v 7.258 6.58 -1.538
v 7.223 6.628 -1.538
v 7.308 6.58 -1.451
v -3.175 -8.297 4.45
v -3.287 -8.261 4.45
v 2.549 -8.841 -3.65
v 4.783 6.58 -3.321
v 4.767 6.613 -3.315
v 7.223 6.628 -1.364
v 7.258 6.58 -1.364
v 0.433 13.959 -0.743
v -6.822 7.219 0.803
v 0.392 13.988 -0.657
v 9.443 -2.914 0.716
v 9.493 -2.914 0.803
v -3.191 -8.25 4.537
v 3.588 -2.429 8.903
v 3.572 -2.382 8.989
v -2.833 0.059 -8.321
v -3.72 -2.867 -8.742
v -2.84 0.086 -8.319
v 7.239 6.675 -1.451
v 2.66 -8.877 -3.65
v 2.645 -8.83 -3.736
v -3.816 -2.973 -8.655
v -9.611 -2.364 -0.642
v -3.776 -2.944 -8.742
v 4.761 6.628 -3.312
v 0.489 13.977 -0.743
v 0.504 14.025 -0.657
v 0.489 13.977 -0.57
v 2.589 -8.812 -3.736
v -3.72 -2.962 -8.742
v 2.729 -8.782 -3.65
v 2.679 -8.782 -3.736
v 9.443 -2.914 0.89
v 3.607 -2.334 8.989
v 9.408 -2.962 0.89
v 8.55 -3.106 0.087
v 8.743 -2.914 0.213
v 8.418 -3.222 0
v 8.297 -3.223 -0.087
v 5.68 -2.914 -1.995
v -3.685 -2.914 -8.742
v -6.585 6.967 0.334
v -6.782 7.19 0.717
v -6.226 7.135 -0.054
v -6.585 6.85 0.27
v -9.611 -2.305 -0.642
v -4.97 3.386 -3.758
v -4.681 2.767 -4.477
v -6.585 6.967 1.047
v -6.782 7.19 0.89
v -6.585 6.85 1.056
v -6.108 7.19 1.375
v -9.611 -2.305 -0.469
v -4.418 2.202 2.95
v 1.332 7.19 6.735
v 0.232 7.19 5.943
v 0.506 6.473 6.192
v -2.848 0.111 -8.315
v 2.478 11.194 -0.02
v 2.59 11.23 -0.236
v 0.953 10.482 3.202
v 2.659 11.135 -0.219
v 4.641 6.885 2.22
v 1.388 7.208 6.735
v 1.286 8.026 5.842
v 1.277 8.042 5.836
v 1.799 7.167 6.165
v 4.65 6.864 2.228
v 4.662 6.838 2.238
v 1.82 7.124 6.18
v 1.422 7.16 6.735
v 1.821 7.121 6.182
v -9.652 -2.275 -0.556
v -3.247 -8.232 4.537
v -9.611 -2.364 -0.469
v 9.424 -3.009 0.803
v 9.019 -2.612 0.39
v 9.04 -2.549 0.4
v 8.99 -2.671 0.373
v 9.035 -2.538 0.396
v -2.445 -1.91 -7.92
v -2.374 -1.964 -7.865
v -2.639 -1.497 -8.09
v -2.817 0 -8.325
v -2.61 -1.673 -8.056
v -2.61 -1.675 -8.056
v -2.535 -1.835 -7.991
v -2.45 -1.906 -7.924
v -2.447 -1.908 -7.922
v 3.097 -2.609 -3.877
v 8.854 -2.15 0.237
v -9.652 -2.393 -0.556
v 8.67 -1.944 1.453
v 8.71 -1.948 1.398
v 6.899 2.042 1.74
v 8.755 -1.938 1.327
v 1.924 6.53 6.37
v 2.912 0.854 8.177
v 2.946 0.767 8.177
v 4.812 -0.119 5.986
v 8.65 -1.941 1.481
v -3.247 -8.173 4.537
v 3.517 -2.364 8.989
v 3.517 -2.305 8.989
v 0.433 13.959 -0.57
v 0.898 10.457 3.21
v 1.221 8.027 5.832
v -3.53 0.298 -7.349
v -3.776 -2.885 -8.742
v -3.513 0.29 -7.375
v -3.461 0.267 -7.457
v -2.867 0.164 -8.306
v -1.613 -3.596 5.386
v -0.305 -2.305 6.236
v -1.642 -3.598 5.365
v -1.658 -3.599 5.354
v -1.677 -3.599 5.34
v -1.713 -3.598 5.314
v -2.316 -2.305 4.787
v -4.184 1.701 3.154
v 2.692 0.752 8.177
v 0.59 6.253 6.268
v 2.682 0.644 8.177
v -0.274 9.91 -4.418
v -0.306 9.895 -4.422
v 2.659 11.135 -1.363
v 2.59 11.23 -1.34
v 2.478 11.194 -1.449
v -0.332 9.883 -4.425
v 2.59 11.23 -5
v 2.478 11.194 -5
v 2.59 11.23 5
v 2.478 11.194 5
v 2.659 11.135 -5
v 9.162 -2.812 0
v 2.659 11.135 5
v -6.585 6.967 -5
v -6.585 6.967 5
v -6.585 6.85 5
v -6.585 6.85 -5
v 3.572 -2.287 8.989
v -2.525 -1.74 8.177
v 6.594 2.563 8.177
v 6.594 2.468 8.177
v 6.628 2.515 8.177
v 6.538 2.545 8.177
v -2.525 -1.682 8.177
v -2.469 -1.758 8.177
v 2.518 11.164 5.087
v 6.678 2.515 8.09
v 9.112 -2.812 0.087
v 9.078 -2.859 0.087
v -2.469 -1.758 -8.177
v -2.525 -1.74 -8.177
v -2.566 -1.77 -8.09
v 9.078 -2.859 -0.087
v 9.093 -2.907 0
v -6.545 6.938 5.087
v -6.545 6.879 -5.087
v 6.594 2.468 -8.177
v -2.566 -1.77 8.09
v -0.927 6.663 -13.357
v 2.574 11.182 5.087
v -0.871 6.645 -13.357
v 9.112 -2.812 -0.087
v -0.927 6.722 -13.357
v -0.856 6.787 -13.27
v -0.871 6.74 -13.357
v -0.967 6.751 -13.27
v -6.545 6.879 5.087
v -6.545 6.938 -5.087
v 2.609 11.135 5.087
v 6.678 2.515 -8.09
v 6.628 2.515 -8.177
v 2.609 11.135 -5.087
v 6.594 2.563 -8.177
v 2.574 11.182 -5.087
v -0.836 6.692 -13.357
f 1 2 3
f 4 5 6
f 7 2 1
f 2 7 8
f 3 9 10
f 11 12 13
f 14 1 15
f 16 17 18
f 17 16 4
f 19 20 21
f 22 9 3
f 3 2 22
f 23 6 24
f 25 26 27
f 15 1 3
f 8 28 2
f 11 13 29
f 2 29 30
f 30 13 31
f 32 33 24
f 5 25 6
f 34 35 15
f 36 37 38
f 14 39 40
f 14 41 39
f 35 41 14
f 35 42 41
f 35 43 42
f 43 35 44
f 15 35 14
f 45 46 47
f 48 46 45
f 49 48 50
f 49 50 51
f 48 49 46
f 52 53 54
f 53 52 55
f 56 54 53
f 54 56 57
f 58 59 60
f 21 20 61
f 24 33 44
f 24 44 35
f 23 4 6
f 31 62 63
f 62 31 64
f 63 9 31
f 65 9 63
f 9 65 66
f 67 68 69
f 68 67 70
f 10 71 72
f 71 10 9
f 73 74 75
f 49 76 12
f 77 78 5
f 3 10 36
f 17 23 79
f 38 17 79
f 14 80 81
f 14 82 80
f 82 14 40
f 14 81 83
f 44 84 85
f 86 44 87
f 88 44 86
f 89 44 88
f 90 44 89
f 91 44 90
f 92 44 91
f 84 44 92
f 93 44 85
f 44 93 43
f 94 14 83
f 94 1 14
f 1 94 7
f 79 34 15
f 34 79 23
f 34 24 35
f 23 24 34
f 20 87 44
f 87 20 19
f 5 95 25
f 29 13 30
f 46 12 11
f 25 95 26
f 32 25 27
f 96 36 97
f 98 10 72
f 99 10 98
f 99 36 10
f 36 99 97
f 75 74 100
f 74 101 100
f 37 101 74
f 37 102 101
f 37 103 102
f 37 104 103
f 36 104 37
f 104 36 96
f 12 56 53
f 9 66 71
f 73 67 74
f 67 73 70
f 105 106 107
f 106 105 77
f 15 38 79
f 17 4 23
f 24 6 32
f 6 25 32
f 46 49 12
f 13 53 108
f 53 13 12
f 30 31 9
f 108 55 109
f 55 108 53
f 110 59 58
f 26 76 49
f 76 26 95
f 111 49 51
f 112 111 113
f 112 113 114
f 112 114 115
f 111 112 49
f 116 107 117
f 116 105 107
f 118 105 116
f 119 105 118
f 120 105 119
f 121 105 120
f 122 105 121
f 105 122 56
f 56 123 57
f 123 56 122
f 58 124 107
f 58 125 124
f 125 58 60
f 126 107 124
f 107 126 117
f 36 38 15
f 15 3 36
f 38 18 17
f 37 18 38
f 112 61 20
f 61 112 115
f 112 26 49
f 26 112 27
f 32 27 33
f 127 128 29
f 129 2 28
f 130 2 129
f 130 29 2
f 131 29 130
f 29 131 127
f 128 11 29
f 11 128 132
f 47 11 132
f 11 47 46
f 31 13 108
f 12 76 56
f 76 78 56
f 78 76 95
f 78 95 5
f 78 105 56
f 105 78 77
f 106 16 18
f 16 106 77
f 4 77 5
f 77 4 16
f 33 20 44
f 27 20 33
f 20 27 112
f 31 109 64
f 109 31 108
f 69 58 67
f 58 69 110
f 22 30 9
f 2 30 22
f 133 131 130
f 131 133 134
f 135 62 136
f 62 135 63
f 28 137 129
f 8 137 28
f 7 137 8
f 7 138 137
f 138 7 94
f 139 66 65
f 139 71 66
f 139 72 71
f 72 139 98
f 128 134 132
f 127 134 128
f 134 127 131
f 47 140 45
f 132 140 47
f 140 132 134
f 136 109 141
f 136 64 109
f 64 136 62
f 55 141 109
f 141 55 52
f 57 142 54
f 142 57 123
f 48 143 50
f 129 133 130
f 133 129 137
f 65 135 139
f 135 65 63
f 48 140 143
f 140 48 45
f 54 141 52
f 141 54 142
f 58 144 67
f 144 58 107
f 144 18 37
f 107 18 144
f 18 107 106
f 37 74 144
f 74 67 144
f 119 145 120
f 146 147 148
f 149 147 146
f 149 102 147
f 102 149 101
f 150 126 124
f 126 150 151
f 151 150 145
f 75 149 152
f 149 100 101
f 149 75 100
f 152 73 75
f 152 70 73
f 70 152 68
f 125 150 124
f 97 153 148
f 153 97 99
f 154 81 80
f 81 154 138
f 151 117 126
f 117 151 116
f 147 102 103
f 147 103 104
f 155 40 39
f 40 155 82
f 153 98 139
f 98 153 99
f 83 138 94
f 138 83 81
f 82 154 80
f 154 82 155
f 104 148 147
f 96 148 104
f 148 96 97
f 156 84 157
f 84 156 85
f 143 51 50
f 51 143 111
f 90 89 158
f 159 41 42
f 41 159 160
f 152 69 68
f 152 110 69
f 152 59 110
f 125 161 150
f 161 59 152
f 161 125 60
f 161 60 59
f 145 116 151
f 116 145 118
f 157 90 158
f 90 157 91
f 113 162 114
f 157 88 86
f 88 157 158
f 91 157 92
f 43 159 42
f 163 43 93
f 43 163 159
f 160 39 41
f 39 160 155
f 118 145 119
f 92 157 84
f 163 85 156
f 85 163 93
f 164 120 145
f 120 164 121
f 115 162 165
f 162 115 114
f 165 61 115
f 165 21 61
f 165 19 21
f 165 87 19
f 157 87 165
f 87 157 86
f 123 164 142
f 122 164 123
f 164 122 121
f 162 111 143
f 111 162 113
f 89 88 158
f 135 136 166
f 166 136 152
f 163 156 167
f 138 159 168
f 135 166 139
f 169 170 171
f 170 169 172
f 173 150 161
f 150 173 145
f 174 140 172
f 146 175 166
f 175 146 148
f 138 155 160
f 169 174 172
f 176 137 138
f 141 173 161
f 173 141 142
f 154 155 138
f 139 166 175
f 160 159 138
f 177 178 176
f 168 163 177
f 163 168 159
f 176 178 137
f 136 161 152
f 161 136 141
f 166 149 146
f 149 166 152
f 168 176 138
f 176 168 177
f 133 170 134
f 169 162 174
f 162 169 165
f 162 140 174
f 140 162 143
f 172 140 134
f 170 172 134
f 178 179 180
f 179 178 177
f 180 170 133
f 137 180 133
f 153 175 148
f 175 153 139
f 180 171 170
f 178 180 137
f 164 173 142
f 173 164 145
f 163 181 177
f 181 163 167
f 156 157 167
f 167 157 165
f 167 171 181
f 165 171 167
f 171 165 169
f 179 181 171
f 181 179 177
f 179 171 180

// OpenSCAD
// Auto-generated OpenSCAD file

    inner_points = 10*[[0.2558824559881848, 1.1134809877530691, 0.5000000000030929], [-0.6504210229442514, 0.6908534873760076, 0.50000000000051], [0.9062393061228075, -0.28117666064270774, -9.353628982466944e-13], [-6.41728096287264e-05, -0.7038041610197694, -3.518157987159043e-12], [0.25588245598941933, 1.1134809877565333, -0.49999999999690703], [-0.6504210229430168, 0.6908534873794716, -0.49999999999948996], [0.6578250941889378, 0.2515351583779428, -0.809016994374344], [-0.24847838474349848, -0.17109234199911882, -0.809016994376927], [0.6578250941869402, 0.251535158372338, 0.8090169943755507], [-0.248478384745496, -0.17109234200472362, 0.8090169943729678], [-0.08864545939497245, 0.6692288945346313, -1.3270070091503023]];

    outer_points = 10*[[0.939271150352653, -0.2914253703744584, 0.0802979287858217], [0.35569526368517285, -0.23342057046774728, 0.8902822667134429], [-0.3735213820712076, -0.2914253703744584, -0.865540194553496], [-0.9570972687386876, -0.23342057046774728, -0.05555585662587481], [0.7207978378522963, 0.6580298560378001, -0.14509990785767551], [0.13722195118481623, 0.7160346559445111, 0.6648844300699457], [-0.09055256736269784, 0.6580298560378001, -0.729660015936789], [-0.674128454030178, 0.7160346559445111, 0.08032432199083217], [0.2629446778976564, -0.8782209710934609, -0.36495865525691407], [-0.3206312087698237, -0.8202161711867498, 0.44502568267070713], [0.04731076808846265, 1.3929484844445685, -0.06566580635435994]];

    // Convex hull for inner set (I)
    module inner_hull() {
        hull() {
            for (p = inner_points) {
                translate(p) sphere(r=0.1);
            }
        }
    }

    // Convex hull for outer set (O) minus inner hull (O \ I)
    module outer_minus_inner() {
        difference() {
            hull() {
                for (p = outer_points) {
                    translate(p) sphere(r=0.1);
                }
            }
            inner_hull(); // Subtract inner hull
        }
    }

    // Convex hull for outer set (O) minus all translated inner hulls
    module outer_minus_AllTranslationInner() {
        difference() {
            hull() {
                for (p = outer_points) {
                    translate(p) sphere(r=0.1);
                }
            }
            hull() {
                translate([0,0,50]) inner_hull();
                translate([0,0,-50]) inner_hull();
            }; // Subtract translated inner hulls
        }
    }

    // Difference between outer_minus_inner and outer_minus_AllTranslationInner
    module outer_minus_inner_diff() {
        difference() {
            // Outer minus inner
            difference() {
                hull() {
                    for (p = outer_points) {
                        translate(p) sphere(r=0.1);
                    }
                }
                inner_hull();
            }

            // Subtract Outer minus AllTranslationInner
            difference() {
                hull() {
                    for (p = outer_points) {
                        translate(p) sphere(r=0.1);
                    }
                }
                hull() {
                    translate([0,0,50]) inner_hull();
                    translate([0,0,-50]) inner_hull();
                };
            }
        }
    }

    // Rendering all with colors applied
    color([1, 0, 0, 0.5]) inner_hull(); // Transparent red
    color([0, 1, 0, 1]) outer_minus_AllTranslationInner(); // Opaque green
    color([1, 1, 0, 1]) outer_minus_inner_diff(); // Opaque yellow
    
